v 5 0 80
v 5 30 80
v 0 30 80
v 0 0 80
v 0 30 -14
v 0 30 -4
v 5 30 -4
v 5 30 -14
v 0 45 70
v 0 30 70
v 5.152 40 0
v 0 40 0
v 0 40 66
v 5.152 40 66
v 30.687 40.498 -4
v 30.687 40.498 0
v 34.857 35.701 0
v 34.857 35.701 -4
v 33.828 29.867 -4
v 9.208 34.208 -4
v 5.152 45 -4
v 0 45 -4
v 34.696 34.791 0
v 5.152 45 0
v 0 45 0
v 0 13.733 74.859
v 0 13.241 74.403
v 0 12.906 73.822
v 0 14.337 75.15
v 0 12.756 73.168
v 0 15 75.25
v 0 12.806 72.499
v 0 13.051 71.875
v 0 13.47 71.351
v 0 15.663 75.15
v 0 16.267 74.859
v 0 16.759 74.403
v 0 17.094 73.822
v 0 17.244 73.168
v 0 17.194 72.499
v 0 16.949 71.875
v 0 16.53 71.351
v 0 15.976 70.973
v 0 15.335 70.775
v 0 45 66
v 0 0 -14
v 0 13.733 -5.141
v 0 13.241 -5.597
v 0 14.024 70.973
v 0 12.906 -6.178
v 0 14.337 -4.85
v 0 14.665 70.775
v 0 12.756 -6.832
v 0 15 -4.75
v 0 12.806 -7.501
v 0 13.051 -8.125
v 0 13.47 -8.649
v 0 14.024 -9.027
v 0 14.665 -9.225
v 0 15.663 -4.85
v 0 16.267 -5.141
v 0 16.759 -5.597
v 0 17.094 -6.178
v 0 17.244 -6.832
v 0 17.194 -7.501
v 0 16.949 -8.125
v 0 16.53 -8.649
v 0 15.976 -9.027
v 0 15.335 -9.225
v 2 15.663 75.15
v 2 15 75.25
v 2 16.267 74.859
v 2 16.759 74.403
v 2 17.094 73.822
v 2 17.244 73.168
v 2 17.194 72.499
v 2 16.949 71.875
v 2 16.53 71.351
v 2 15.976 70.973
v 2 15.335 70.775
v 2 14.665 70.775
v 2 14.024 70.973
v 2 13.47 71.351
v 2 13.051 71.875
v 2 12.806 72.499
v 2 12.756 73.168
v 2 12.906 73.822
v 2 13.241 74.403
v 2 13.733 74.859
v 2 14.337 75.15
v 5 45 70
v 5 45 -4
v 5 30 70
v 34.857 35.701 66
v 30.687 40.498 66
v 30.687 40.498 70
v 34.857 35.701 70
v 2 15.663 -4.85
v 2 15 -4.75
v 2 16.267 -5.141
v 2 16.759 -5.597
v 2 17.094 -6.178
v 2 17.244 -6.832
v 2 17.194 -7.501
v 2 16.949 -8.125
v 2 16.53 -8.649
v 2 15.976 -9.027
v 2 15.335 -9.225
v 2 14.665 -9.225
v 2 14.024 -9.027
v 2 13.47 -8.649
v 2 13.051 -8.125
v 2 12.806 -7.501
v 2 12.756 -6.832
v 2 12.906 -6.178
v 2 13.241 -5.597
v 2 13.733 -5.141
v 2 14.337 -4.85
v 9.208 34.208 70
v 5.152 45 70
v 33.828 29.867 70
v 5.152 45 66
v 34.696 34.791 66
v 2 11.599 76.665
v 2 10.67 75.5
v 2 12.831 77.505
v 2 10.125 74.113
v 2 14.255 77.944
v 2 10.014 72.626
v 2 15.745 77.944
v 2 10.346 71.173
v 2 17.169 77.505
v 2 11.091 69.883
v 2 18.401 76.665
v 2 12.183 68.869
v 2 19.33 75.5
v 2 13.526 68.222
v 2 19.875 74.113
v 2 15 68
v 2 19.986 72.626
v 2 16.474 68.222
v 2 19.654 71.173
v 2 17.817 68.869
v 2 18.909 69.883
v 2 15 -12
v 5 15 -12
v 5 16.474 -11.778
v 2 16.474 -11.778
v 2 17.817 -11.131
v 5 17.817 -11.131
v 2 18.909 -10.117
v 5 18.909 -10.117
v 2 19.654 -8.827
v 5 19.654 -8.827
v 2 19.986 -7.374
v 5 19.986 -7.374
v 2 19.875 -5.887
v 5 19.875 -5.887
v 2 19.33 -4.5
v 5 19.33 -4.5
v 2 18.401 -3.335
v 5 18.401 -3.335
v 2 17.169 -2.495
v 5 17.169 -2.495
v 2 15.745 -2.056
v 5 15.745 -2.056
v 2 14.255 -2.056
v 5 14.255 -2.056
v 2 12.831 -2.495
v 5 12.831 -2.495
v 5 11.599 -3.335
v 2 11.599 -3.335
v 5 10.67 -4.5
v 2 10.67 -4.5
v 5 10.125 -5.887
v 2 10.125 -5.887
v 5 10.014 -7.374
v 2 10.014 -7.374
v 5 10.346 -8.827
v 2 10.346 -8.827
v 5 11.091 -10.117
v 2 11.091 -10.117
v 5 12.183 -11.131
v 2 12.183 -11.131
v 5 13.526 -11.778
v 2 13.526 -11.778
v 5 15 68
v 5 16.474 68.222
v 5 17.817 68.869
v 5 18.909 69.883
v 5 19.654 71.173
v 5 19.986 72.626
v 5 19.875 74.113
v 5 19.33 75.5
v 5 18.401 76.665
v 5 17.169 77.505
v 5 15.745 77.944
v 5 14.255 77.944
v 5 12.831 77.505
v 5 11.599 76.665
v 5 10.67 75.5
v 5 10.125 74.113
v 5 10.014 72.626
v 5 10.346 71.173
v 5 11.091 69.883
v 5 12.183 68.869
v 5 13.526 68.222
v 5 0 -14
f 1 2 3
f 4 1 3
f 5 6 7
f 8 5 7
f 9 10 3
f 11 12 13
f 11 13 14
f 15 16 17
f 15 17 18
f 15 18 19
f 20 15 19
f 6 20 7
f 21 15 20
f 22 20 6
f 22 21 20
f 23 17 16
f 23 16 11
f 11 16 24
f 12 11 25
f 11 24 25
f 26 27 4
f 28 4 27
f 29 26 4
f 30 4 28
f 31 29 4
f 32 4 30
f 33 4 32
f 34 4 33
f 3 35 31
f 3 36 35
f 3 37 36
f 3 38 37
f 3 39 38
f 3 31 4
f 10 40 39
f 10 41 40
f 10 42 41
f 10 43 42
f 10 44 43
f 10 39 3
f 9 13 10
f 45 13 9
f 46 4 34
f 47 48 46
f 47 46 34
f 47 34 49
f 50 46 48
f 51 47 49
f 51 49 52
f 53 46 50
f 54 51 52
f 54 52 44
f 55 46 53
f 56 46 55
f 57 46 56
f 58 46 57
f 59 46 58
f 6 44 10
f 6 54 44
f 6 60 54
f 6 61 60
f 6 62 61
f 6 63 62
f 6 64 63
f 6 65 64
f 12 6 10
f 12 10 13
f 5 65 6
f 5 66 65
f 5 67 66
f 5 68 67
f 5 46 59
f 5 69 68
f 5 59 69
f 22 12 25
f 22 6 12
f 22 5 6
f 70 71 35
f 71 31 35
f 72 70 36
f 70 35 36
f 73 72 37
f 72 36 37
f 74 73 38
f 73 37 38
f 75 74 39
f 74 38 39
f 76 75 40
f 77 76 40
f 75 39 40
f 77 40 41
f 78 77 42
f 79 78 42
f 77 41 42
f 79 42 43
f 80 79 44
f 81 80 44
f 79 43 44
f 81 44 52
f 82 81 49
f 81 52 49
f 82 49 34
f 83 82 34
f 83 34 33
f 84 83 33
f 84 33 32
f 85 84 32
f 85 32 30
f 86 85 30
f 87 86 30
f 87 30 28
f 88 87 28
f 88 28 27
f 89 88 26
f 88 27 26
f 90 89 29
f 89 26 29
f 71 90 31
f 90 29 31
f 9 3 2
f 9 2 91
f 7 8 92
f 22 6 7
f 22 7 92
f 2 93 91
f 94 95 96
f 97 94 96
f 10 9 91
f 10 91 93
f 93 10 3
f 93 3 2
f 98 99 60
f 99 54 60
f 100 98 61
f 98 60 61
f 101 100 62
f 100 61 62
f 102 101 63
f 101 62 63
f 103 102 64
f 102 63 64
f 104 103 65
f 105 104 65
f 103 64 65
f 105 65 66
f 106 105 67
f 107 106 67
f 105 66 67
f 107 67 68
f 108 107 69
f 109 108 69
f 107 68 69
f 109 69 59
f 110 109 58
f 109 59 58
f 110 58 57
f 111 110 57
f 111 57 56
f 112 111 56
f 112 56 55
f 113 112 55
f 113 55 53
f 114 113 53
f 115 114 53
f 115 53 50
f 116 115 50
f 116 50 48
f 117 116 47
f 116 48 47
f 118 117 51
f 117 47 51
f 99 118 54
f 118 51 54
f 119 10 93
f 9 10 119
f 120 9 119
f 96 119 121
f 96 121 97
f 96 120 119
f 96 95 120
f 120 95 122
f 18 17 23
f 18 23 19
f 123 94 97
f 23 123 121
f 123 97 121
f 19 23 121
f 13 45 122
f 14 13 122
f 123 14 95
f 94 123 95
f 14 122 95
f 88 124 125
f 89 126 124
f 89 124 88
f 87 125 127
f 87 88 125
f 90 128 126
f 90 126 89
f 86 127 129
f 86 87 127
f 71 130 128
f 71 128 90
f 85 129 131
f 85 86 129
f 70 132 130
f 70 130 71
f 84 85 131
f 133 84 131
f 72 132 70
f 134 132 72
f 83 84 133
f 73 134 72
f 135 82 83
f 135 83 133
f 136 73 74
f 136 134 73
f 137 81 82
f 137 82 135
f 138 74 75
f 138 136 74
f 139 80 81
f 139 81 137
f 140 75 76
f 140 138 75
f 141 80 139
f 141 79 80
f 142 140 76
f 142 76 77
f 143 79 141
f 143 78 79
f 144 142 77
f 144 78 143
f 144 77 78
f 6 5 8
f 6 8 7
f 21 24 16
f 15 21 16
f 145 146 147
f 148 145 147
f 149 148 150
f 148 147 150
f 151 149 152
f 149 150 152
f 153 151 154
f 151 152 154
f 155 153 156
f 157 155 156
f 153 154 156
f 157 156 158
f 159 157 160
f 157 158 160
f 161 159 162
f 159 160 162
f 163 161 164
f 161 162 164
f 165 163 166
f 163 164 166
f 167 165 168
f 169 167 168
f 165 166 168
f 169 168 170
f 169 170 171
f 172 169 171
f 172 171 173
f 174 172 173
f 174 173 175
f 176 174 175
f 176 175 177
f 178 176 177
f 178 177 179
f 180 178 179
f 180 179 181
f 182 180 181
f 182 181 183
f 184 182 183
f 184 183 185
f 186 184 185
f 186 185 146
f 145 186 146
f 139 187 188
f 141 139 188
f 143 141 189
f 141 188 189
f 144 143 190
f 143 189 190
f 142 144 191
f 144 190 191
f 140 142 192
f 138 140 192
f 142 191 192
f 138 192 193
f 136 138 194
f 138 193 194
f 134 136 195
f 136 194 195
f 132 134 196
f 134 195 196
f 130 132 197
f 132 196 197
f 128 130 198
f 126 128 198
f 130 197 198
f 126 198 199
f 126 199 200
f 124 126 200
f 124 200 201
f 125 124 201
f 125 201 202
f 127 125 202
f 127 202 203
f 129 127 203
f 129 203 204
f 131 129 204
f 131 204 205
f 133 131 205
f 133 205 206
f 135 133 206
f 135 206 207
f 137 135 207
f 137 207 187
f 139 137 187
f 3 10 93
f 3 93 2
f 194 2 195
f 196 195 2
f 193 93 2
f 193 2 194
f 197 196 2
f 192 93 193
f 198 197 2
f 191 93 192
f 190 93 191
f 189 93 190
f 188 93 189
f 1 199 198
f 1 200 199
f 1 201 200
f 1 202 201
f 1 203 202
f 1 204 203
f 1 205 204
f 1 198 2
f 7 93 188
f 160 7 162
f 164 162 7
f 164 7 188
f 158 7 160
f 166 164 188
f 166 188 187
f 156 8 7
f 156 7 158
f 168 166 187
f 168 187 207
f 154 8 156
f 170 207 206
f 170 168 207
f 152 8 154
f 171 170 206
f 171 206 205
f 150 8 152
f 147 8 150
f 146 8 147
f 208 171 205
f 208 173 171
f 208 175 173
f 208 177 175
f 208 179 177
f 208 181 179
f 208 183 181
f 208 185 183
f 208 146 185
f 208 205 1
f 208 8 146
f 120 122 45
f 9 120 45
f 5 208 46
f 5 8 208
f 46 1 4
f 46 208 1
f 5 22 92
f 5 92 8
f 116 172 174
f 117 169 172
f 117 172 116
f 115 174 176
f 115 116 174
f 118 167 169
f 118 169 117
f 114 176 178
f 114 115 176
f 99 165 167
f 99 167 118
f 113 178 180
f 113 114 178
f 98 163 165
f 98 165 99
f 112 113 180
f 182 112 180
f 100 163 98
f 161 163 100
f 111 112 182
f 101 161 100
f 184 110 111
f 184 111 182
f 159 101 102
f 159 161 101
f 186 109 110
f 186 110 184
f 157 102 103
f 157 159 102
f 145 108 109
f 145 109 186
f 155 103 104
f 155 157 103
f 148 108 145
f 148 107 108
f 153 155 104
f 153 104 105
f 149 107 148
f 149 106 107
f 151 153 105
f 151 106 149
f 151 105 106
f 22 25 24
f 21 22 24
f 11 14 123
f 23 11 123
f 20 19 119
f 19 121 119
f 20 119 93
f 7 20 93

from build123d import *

# Parameters (mm, degrees)
ESTRUSIONE_ESTRUSIONE1_DEPTH                         = 66
ESTRUSIONE_ESTRUSIONE2_DEPTH                         = 4
ESTRUSIONE_ESTRUSIONE3_DEPTH                         = 4
ESTRUSIONE_ESTRUSIONE4_DEPTH                         = 10
ESTRUSIONE_ESTRUSIONE5_DEPTH                         = 10
FORO_LAMATO_PER_VITE_M4_A_TESTA_CILINDRI_D           = 4.5
FORO_LAMATO_PER_VITE_M4_A_TESTA_CILINDRI_DEPTH       = 45
FORO_LAMATO_PER_VITE_M4_A_TESTA_CILINDRI_CBORE_D     = 10
FORO_LAMATO_PER_VITE_M4_A_TESTA_CILINDRI_CBORE_DEPTH = 3
FORO_LAMATO_PER_VITE_M4_A_TESTA_CILINDRI_TIP         = 1.3519363928120107
ESTRUSIONE_ESTRUSIONE6_DEPTH                         = 5
ESTRUSIONE_ESTRUSIONE6_2_DEPTH                       = 5
SMUSSO2_SIZE                                         = 4
SMUSSO2_SIZE2                                        = 4.93958862614021
SMUSSO3_SIZE                                         = 4
SMUSSO3_SIZE2                                        = 4.939588626140206


with BuildPart() as part:
    # Schizzo1 → Estrusione-Estrusione1 (new body)
    with BuildSketch(Plane.XY):
        Polygon((0, 0), (0, 40), (5.15192246987794, 40), (34.69615506024418, 34.790554669992055), (33.82791417190951, 29.86651590493102), (9.207720346604313, 34.2077203466043), (4.9999999999999964, 30), (5, 0), align=None)
    extrude(amount=ESTRUSIONE_ESTRUSIONE1_DEPTH)

    # Schizzo3 → Estrusione-Estrusione2 (add)
    with BuildSketch(Plane.XY.offset(66)):
        Polygon((0, 40), (0, 0), (5, 0), (4.9999999999999964, 30), (9.207720346604313, 34.2077203466043), (33.82791417190951, 29.86651590493102), (34.69615506024418, 34.790554669992055), (5.15192246987794, 40), align=None)
        Polygon((-1.2e-16, 45), (-1.1e-16, 40), (5.15192246987794, 40), (34.69615506024418, 34.790554669992055), (35.55120541855835, 39.63978622195683), (5.15192246987794, 45), align=None)
    extrude(amount=ESTRUSIONE_ESTRUSIONE2_DEPTH)

    # Schizzo4 → Estrusione-Estrusione3 (add)
    with BuildSketch(Plane(origin=(0, 0, 0), x_dir=(-1, 0, 0), z_dir=(0, 0, -1))):
        Polygon((-5, 0), (0, 0), (1.2e-16, 45), (-5.15192246987794, 45), (-35.55120541855835, 39.63978622195684), (-33.82791417190951, 29.86651590493102), (-9.207720346604313, 34.2077203466043), (-4.9999999999999964, 30), align=None)
    extrude(amount=ESTRUSIONE_ESTRUSIONE3_DEPTH)

    # Schizzo5 → Estrusione-Estrusione4 (add)
    with BuildSketch(Plane(origin=(0, 0, -4), x_dir=(-1, 0, 0), z_dir=(0, 0, -1))):
        Polygon((-5, 0), (0, 0), (0, 30), (-4.9999999999999964, 30), align=None)
    extrude(amount=ESTRUSIONE_ESTRUSIONE4_DEPTH)

    # Schizzo6 → Estrusione-Estrusione5 (add)
    with BuildSketch(Plane.XY.offset(70)):
        Polygon((0, 0), (0, 30.000000000000004), (4.999999999999994, 30.000000000000004), (5, 0), align=None)
    extrude(amount=ESTRUSIONE_ESTRUSIONE5_DEPTH)

    # Foro lamato per Vite M4 a testa cilindrica piana-2
    with Locations(Plane(origin=(5, 5.8e-16, 0), x_dir=(0, 0, -1), z_dir=(1, 1.2e-16, 0))):
        with Locations((-73, 15), (7, 15)):
            CounterBoreHole(FORO_LAMATO_PER_VITE_M4_A_TESTA_CILINDRI_D / 2, FORO_LAMATO_PER_VITE_M4_A_TESTA_CILINDRI_CBORE_D / 2, FORO_LAMATO_PER_VITE_M4_A_TESTA_CILINDRI_CBORE_DEPTH, depth=FORO_LAMATO_PER_VITE_M4_A_TESTA_CILINDRI_DEPTH)
            with Locations((0, 0, -(FORO_LAMATO_PER_VITE_M4_A_TESTA_CILINDRI_DEPTH + FORO_LAMATO_PER_VITE_M4_A_TESTA_CILINDRI_TIP / 2))):  # 118° drill point
                Cone(0, FORO_LAMATO_PER_VITE_M4_A_TESTA_CILINDRI_D / 2, FORO_LAMATO_PER_VITE_M4_A_TESTA_CILINDRI_TIP, mode=Mode.SUBTRACT)

    # Smusso2
    smusso2_edges = [part.edges().sort_by_distance(p)[0] for p in [
        (35.55120541855835, 39.63978622195683, 68),
    ]]
    smusso2_side = [part.faces().sort_by_distance(p)[0] for p in [
        (34.344943382970804, 32.79873426983414, 33),
    ]]
    chamfer(smusso2_edges, length=SMUSSO2_SIZE, length2=SMUSSO2_SIZE2, reference=smusso2_side[0])

    # Smusso3
    smusso3_edges = [part.edges().sort_by_distance(p)[0] for p in [
        (35.55120541855835, 39.63978622195684, -2),
    ]]
    smusso3_side = [part.faces().sort_by_distance(p)[0] for p in [
        (34.310007644445946, 32.6006038510832, 31.57648462973645),
    ]]
    chamfer(smusso3_edges, length=SMUSSO3_SIZE, length2=SMUSSO3_SIZE2, reference=smusso3_side[0])


with BuildPart() as body_2:
    # Schizzo9 → Estrusione-Estrusione6 (new body)
    with BuildSketch(Plane.ZY):
        Polygon((-4, 45), (-14, 30), (-4, 29.999999999999993), align=None)
    extrude(amount=-ESTRUSIONE_ESTRUSIONE6_DEPTH)


with BuildPart() as body_3:
    # Schizzo9 → Estrusione-Estrusione6 2 (new body)
    with BuildSketch(Plane.ZY):
        Polygon((70, 45), (70, 30.000000000000004), (80, 30.000000000000004), align=None)
    extrude(amount=-ESTRUSIONE_ESTRUSIONE6_2_DEPTH)


solid = Compound([part.part, body_2.part, body_3.part])
